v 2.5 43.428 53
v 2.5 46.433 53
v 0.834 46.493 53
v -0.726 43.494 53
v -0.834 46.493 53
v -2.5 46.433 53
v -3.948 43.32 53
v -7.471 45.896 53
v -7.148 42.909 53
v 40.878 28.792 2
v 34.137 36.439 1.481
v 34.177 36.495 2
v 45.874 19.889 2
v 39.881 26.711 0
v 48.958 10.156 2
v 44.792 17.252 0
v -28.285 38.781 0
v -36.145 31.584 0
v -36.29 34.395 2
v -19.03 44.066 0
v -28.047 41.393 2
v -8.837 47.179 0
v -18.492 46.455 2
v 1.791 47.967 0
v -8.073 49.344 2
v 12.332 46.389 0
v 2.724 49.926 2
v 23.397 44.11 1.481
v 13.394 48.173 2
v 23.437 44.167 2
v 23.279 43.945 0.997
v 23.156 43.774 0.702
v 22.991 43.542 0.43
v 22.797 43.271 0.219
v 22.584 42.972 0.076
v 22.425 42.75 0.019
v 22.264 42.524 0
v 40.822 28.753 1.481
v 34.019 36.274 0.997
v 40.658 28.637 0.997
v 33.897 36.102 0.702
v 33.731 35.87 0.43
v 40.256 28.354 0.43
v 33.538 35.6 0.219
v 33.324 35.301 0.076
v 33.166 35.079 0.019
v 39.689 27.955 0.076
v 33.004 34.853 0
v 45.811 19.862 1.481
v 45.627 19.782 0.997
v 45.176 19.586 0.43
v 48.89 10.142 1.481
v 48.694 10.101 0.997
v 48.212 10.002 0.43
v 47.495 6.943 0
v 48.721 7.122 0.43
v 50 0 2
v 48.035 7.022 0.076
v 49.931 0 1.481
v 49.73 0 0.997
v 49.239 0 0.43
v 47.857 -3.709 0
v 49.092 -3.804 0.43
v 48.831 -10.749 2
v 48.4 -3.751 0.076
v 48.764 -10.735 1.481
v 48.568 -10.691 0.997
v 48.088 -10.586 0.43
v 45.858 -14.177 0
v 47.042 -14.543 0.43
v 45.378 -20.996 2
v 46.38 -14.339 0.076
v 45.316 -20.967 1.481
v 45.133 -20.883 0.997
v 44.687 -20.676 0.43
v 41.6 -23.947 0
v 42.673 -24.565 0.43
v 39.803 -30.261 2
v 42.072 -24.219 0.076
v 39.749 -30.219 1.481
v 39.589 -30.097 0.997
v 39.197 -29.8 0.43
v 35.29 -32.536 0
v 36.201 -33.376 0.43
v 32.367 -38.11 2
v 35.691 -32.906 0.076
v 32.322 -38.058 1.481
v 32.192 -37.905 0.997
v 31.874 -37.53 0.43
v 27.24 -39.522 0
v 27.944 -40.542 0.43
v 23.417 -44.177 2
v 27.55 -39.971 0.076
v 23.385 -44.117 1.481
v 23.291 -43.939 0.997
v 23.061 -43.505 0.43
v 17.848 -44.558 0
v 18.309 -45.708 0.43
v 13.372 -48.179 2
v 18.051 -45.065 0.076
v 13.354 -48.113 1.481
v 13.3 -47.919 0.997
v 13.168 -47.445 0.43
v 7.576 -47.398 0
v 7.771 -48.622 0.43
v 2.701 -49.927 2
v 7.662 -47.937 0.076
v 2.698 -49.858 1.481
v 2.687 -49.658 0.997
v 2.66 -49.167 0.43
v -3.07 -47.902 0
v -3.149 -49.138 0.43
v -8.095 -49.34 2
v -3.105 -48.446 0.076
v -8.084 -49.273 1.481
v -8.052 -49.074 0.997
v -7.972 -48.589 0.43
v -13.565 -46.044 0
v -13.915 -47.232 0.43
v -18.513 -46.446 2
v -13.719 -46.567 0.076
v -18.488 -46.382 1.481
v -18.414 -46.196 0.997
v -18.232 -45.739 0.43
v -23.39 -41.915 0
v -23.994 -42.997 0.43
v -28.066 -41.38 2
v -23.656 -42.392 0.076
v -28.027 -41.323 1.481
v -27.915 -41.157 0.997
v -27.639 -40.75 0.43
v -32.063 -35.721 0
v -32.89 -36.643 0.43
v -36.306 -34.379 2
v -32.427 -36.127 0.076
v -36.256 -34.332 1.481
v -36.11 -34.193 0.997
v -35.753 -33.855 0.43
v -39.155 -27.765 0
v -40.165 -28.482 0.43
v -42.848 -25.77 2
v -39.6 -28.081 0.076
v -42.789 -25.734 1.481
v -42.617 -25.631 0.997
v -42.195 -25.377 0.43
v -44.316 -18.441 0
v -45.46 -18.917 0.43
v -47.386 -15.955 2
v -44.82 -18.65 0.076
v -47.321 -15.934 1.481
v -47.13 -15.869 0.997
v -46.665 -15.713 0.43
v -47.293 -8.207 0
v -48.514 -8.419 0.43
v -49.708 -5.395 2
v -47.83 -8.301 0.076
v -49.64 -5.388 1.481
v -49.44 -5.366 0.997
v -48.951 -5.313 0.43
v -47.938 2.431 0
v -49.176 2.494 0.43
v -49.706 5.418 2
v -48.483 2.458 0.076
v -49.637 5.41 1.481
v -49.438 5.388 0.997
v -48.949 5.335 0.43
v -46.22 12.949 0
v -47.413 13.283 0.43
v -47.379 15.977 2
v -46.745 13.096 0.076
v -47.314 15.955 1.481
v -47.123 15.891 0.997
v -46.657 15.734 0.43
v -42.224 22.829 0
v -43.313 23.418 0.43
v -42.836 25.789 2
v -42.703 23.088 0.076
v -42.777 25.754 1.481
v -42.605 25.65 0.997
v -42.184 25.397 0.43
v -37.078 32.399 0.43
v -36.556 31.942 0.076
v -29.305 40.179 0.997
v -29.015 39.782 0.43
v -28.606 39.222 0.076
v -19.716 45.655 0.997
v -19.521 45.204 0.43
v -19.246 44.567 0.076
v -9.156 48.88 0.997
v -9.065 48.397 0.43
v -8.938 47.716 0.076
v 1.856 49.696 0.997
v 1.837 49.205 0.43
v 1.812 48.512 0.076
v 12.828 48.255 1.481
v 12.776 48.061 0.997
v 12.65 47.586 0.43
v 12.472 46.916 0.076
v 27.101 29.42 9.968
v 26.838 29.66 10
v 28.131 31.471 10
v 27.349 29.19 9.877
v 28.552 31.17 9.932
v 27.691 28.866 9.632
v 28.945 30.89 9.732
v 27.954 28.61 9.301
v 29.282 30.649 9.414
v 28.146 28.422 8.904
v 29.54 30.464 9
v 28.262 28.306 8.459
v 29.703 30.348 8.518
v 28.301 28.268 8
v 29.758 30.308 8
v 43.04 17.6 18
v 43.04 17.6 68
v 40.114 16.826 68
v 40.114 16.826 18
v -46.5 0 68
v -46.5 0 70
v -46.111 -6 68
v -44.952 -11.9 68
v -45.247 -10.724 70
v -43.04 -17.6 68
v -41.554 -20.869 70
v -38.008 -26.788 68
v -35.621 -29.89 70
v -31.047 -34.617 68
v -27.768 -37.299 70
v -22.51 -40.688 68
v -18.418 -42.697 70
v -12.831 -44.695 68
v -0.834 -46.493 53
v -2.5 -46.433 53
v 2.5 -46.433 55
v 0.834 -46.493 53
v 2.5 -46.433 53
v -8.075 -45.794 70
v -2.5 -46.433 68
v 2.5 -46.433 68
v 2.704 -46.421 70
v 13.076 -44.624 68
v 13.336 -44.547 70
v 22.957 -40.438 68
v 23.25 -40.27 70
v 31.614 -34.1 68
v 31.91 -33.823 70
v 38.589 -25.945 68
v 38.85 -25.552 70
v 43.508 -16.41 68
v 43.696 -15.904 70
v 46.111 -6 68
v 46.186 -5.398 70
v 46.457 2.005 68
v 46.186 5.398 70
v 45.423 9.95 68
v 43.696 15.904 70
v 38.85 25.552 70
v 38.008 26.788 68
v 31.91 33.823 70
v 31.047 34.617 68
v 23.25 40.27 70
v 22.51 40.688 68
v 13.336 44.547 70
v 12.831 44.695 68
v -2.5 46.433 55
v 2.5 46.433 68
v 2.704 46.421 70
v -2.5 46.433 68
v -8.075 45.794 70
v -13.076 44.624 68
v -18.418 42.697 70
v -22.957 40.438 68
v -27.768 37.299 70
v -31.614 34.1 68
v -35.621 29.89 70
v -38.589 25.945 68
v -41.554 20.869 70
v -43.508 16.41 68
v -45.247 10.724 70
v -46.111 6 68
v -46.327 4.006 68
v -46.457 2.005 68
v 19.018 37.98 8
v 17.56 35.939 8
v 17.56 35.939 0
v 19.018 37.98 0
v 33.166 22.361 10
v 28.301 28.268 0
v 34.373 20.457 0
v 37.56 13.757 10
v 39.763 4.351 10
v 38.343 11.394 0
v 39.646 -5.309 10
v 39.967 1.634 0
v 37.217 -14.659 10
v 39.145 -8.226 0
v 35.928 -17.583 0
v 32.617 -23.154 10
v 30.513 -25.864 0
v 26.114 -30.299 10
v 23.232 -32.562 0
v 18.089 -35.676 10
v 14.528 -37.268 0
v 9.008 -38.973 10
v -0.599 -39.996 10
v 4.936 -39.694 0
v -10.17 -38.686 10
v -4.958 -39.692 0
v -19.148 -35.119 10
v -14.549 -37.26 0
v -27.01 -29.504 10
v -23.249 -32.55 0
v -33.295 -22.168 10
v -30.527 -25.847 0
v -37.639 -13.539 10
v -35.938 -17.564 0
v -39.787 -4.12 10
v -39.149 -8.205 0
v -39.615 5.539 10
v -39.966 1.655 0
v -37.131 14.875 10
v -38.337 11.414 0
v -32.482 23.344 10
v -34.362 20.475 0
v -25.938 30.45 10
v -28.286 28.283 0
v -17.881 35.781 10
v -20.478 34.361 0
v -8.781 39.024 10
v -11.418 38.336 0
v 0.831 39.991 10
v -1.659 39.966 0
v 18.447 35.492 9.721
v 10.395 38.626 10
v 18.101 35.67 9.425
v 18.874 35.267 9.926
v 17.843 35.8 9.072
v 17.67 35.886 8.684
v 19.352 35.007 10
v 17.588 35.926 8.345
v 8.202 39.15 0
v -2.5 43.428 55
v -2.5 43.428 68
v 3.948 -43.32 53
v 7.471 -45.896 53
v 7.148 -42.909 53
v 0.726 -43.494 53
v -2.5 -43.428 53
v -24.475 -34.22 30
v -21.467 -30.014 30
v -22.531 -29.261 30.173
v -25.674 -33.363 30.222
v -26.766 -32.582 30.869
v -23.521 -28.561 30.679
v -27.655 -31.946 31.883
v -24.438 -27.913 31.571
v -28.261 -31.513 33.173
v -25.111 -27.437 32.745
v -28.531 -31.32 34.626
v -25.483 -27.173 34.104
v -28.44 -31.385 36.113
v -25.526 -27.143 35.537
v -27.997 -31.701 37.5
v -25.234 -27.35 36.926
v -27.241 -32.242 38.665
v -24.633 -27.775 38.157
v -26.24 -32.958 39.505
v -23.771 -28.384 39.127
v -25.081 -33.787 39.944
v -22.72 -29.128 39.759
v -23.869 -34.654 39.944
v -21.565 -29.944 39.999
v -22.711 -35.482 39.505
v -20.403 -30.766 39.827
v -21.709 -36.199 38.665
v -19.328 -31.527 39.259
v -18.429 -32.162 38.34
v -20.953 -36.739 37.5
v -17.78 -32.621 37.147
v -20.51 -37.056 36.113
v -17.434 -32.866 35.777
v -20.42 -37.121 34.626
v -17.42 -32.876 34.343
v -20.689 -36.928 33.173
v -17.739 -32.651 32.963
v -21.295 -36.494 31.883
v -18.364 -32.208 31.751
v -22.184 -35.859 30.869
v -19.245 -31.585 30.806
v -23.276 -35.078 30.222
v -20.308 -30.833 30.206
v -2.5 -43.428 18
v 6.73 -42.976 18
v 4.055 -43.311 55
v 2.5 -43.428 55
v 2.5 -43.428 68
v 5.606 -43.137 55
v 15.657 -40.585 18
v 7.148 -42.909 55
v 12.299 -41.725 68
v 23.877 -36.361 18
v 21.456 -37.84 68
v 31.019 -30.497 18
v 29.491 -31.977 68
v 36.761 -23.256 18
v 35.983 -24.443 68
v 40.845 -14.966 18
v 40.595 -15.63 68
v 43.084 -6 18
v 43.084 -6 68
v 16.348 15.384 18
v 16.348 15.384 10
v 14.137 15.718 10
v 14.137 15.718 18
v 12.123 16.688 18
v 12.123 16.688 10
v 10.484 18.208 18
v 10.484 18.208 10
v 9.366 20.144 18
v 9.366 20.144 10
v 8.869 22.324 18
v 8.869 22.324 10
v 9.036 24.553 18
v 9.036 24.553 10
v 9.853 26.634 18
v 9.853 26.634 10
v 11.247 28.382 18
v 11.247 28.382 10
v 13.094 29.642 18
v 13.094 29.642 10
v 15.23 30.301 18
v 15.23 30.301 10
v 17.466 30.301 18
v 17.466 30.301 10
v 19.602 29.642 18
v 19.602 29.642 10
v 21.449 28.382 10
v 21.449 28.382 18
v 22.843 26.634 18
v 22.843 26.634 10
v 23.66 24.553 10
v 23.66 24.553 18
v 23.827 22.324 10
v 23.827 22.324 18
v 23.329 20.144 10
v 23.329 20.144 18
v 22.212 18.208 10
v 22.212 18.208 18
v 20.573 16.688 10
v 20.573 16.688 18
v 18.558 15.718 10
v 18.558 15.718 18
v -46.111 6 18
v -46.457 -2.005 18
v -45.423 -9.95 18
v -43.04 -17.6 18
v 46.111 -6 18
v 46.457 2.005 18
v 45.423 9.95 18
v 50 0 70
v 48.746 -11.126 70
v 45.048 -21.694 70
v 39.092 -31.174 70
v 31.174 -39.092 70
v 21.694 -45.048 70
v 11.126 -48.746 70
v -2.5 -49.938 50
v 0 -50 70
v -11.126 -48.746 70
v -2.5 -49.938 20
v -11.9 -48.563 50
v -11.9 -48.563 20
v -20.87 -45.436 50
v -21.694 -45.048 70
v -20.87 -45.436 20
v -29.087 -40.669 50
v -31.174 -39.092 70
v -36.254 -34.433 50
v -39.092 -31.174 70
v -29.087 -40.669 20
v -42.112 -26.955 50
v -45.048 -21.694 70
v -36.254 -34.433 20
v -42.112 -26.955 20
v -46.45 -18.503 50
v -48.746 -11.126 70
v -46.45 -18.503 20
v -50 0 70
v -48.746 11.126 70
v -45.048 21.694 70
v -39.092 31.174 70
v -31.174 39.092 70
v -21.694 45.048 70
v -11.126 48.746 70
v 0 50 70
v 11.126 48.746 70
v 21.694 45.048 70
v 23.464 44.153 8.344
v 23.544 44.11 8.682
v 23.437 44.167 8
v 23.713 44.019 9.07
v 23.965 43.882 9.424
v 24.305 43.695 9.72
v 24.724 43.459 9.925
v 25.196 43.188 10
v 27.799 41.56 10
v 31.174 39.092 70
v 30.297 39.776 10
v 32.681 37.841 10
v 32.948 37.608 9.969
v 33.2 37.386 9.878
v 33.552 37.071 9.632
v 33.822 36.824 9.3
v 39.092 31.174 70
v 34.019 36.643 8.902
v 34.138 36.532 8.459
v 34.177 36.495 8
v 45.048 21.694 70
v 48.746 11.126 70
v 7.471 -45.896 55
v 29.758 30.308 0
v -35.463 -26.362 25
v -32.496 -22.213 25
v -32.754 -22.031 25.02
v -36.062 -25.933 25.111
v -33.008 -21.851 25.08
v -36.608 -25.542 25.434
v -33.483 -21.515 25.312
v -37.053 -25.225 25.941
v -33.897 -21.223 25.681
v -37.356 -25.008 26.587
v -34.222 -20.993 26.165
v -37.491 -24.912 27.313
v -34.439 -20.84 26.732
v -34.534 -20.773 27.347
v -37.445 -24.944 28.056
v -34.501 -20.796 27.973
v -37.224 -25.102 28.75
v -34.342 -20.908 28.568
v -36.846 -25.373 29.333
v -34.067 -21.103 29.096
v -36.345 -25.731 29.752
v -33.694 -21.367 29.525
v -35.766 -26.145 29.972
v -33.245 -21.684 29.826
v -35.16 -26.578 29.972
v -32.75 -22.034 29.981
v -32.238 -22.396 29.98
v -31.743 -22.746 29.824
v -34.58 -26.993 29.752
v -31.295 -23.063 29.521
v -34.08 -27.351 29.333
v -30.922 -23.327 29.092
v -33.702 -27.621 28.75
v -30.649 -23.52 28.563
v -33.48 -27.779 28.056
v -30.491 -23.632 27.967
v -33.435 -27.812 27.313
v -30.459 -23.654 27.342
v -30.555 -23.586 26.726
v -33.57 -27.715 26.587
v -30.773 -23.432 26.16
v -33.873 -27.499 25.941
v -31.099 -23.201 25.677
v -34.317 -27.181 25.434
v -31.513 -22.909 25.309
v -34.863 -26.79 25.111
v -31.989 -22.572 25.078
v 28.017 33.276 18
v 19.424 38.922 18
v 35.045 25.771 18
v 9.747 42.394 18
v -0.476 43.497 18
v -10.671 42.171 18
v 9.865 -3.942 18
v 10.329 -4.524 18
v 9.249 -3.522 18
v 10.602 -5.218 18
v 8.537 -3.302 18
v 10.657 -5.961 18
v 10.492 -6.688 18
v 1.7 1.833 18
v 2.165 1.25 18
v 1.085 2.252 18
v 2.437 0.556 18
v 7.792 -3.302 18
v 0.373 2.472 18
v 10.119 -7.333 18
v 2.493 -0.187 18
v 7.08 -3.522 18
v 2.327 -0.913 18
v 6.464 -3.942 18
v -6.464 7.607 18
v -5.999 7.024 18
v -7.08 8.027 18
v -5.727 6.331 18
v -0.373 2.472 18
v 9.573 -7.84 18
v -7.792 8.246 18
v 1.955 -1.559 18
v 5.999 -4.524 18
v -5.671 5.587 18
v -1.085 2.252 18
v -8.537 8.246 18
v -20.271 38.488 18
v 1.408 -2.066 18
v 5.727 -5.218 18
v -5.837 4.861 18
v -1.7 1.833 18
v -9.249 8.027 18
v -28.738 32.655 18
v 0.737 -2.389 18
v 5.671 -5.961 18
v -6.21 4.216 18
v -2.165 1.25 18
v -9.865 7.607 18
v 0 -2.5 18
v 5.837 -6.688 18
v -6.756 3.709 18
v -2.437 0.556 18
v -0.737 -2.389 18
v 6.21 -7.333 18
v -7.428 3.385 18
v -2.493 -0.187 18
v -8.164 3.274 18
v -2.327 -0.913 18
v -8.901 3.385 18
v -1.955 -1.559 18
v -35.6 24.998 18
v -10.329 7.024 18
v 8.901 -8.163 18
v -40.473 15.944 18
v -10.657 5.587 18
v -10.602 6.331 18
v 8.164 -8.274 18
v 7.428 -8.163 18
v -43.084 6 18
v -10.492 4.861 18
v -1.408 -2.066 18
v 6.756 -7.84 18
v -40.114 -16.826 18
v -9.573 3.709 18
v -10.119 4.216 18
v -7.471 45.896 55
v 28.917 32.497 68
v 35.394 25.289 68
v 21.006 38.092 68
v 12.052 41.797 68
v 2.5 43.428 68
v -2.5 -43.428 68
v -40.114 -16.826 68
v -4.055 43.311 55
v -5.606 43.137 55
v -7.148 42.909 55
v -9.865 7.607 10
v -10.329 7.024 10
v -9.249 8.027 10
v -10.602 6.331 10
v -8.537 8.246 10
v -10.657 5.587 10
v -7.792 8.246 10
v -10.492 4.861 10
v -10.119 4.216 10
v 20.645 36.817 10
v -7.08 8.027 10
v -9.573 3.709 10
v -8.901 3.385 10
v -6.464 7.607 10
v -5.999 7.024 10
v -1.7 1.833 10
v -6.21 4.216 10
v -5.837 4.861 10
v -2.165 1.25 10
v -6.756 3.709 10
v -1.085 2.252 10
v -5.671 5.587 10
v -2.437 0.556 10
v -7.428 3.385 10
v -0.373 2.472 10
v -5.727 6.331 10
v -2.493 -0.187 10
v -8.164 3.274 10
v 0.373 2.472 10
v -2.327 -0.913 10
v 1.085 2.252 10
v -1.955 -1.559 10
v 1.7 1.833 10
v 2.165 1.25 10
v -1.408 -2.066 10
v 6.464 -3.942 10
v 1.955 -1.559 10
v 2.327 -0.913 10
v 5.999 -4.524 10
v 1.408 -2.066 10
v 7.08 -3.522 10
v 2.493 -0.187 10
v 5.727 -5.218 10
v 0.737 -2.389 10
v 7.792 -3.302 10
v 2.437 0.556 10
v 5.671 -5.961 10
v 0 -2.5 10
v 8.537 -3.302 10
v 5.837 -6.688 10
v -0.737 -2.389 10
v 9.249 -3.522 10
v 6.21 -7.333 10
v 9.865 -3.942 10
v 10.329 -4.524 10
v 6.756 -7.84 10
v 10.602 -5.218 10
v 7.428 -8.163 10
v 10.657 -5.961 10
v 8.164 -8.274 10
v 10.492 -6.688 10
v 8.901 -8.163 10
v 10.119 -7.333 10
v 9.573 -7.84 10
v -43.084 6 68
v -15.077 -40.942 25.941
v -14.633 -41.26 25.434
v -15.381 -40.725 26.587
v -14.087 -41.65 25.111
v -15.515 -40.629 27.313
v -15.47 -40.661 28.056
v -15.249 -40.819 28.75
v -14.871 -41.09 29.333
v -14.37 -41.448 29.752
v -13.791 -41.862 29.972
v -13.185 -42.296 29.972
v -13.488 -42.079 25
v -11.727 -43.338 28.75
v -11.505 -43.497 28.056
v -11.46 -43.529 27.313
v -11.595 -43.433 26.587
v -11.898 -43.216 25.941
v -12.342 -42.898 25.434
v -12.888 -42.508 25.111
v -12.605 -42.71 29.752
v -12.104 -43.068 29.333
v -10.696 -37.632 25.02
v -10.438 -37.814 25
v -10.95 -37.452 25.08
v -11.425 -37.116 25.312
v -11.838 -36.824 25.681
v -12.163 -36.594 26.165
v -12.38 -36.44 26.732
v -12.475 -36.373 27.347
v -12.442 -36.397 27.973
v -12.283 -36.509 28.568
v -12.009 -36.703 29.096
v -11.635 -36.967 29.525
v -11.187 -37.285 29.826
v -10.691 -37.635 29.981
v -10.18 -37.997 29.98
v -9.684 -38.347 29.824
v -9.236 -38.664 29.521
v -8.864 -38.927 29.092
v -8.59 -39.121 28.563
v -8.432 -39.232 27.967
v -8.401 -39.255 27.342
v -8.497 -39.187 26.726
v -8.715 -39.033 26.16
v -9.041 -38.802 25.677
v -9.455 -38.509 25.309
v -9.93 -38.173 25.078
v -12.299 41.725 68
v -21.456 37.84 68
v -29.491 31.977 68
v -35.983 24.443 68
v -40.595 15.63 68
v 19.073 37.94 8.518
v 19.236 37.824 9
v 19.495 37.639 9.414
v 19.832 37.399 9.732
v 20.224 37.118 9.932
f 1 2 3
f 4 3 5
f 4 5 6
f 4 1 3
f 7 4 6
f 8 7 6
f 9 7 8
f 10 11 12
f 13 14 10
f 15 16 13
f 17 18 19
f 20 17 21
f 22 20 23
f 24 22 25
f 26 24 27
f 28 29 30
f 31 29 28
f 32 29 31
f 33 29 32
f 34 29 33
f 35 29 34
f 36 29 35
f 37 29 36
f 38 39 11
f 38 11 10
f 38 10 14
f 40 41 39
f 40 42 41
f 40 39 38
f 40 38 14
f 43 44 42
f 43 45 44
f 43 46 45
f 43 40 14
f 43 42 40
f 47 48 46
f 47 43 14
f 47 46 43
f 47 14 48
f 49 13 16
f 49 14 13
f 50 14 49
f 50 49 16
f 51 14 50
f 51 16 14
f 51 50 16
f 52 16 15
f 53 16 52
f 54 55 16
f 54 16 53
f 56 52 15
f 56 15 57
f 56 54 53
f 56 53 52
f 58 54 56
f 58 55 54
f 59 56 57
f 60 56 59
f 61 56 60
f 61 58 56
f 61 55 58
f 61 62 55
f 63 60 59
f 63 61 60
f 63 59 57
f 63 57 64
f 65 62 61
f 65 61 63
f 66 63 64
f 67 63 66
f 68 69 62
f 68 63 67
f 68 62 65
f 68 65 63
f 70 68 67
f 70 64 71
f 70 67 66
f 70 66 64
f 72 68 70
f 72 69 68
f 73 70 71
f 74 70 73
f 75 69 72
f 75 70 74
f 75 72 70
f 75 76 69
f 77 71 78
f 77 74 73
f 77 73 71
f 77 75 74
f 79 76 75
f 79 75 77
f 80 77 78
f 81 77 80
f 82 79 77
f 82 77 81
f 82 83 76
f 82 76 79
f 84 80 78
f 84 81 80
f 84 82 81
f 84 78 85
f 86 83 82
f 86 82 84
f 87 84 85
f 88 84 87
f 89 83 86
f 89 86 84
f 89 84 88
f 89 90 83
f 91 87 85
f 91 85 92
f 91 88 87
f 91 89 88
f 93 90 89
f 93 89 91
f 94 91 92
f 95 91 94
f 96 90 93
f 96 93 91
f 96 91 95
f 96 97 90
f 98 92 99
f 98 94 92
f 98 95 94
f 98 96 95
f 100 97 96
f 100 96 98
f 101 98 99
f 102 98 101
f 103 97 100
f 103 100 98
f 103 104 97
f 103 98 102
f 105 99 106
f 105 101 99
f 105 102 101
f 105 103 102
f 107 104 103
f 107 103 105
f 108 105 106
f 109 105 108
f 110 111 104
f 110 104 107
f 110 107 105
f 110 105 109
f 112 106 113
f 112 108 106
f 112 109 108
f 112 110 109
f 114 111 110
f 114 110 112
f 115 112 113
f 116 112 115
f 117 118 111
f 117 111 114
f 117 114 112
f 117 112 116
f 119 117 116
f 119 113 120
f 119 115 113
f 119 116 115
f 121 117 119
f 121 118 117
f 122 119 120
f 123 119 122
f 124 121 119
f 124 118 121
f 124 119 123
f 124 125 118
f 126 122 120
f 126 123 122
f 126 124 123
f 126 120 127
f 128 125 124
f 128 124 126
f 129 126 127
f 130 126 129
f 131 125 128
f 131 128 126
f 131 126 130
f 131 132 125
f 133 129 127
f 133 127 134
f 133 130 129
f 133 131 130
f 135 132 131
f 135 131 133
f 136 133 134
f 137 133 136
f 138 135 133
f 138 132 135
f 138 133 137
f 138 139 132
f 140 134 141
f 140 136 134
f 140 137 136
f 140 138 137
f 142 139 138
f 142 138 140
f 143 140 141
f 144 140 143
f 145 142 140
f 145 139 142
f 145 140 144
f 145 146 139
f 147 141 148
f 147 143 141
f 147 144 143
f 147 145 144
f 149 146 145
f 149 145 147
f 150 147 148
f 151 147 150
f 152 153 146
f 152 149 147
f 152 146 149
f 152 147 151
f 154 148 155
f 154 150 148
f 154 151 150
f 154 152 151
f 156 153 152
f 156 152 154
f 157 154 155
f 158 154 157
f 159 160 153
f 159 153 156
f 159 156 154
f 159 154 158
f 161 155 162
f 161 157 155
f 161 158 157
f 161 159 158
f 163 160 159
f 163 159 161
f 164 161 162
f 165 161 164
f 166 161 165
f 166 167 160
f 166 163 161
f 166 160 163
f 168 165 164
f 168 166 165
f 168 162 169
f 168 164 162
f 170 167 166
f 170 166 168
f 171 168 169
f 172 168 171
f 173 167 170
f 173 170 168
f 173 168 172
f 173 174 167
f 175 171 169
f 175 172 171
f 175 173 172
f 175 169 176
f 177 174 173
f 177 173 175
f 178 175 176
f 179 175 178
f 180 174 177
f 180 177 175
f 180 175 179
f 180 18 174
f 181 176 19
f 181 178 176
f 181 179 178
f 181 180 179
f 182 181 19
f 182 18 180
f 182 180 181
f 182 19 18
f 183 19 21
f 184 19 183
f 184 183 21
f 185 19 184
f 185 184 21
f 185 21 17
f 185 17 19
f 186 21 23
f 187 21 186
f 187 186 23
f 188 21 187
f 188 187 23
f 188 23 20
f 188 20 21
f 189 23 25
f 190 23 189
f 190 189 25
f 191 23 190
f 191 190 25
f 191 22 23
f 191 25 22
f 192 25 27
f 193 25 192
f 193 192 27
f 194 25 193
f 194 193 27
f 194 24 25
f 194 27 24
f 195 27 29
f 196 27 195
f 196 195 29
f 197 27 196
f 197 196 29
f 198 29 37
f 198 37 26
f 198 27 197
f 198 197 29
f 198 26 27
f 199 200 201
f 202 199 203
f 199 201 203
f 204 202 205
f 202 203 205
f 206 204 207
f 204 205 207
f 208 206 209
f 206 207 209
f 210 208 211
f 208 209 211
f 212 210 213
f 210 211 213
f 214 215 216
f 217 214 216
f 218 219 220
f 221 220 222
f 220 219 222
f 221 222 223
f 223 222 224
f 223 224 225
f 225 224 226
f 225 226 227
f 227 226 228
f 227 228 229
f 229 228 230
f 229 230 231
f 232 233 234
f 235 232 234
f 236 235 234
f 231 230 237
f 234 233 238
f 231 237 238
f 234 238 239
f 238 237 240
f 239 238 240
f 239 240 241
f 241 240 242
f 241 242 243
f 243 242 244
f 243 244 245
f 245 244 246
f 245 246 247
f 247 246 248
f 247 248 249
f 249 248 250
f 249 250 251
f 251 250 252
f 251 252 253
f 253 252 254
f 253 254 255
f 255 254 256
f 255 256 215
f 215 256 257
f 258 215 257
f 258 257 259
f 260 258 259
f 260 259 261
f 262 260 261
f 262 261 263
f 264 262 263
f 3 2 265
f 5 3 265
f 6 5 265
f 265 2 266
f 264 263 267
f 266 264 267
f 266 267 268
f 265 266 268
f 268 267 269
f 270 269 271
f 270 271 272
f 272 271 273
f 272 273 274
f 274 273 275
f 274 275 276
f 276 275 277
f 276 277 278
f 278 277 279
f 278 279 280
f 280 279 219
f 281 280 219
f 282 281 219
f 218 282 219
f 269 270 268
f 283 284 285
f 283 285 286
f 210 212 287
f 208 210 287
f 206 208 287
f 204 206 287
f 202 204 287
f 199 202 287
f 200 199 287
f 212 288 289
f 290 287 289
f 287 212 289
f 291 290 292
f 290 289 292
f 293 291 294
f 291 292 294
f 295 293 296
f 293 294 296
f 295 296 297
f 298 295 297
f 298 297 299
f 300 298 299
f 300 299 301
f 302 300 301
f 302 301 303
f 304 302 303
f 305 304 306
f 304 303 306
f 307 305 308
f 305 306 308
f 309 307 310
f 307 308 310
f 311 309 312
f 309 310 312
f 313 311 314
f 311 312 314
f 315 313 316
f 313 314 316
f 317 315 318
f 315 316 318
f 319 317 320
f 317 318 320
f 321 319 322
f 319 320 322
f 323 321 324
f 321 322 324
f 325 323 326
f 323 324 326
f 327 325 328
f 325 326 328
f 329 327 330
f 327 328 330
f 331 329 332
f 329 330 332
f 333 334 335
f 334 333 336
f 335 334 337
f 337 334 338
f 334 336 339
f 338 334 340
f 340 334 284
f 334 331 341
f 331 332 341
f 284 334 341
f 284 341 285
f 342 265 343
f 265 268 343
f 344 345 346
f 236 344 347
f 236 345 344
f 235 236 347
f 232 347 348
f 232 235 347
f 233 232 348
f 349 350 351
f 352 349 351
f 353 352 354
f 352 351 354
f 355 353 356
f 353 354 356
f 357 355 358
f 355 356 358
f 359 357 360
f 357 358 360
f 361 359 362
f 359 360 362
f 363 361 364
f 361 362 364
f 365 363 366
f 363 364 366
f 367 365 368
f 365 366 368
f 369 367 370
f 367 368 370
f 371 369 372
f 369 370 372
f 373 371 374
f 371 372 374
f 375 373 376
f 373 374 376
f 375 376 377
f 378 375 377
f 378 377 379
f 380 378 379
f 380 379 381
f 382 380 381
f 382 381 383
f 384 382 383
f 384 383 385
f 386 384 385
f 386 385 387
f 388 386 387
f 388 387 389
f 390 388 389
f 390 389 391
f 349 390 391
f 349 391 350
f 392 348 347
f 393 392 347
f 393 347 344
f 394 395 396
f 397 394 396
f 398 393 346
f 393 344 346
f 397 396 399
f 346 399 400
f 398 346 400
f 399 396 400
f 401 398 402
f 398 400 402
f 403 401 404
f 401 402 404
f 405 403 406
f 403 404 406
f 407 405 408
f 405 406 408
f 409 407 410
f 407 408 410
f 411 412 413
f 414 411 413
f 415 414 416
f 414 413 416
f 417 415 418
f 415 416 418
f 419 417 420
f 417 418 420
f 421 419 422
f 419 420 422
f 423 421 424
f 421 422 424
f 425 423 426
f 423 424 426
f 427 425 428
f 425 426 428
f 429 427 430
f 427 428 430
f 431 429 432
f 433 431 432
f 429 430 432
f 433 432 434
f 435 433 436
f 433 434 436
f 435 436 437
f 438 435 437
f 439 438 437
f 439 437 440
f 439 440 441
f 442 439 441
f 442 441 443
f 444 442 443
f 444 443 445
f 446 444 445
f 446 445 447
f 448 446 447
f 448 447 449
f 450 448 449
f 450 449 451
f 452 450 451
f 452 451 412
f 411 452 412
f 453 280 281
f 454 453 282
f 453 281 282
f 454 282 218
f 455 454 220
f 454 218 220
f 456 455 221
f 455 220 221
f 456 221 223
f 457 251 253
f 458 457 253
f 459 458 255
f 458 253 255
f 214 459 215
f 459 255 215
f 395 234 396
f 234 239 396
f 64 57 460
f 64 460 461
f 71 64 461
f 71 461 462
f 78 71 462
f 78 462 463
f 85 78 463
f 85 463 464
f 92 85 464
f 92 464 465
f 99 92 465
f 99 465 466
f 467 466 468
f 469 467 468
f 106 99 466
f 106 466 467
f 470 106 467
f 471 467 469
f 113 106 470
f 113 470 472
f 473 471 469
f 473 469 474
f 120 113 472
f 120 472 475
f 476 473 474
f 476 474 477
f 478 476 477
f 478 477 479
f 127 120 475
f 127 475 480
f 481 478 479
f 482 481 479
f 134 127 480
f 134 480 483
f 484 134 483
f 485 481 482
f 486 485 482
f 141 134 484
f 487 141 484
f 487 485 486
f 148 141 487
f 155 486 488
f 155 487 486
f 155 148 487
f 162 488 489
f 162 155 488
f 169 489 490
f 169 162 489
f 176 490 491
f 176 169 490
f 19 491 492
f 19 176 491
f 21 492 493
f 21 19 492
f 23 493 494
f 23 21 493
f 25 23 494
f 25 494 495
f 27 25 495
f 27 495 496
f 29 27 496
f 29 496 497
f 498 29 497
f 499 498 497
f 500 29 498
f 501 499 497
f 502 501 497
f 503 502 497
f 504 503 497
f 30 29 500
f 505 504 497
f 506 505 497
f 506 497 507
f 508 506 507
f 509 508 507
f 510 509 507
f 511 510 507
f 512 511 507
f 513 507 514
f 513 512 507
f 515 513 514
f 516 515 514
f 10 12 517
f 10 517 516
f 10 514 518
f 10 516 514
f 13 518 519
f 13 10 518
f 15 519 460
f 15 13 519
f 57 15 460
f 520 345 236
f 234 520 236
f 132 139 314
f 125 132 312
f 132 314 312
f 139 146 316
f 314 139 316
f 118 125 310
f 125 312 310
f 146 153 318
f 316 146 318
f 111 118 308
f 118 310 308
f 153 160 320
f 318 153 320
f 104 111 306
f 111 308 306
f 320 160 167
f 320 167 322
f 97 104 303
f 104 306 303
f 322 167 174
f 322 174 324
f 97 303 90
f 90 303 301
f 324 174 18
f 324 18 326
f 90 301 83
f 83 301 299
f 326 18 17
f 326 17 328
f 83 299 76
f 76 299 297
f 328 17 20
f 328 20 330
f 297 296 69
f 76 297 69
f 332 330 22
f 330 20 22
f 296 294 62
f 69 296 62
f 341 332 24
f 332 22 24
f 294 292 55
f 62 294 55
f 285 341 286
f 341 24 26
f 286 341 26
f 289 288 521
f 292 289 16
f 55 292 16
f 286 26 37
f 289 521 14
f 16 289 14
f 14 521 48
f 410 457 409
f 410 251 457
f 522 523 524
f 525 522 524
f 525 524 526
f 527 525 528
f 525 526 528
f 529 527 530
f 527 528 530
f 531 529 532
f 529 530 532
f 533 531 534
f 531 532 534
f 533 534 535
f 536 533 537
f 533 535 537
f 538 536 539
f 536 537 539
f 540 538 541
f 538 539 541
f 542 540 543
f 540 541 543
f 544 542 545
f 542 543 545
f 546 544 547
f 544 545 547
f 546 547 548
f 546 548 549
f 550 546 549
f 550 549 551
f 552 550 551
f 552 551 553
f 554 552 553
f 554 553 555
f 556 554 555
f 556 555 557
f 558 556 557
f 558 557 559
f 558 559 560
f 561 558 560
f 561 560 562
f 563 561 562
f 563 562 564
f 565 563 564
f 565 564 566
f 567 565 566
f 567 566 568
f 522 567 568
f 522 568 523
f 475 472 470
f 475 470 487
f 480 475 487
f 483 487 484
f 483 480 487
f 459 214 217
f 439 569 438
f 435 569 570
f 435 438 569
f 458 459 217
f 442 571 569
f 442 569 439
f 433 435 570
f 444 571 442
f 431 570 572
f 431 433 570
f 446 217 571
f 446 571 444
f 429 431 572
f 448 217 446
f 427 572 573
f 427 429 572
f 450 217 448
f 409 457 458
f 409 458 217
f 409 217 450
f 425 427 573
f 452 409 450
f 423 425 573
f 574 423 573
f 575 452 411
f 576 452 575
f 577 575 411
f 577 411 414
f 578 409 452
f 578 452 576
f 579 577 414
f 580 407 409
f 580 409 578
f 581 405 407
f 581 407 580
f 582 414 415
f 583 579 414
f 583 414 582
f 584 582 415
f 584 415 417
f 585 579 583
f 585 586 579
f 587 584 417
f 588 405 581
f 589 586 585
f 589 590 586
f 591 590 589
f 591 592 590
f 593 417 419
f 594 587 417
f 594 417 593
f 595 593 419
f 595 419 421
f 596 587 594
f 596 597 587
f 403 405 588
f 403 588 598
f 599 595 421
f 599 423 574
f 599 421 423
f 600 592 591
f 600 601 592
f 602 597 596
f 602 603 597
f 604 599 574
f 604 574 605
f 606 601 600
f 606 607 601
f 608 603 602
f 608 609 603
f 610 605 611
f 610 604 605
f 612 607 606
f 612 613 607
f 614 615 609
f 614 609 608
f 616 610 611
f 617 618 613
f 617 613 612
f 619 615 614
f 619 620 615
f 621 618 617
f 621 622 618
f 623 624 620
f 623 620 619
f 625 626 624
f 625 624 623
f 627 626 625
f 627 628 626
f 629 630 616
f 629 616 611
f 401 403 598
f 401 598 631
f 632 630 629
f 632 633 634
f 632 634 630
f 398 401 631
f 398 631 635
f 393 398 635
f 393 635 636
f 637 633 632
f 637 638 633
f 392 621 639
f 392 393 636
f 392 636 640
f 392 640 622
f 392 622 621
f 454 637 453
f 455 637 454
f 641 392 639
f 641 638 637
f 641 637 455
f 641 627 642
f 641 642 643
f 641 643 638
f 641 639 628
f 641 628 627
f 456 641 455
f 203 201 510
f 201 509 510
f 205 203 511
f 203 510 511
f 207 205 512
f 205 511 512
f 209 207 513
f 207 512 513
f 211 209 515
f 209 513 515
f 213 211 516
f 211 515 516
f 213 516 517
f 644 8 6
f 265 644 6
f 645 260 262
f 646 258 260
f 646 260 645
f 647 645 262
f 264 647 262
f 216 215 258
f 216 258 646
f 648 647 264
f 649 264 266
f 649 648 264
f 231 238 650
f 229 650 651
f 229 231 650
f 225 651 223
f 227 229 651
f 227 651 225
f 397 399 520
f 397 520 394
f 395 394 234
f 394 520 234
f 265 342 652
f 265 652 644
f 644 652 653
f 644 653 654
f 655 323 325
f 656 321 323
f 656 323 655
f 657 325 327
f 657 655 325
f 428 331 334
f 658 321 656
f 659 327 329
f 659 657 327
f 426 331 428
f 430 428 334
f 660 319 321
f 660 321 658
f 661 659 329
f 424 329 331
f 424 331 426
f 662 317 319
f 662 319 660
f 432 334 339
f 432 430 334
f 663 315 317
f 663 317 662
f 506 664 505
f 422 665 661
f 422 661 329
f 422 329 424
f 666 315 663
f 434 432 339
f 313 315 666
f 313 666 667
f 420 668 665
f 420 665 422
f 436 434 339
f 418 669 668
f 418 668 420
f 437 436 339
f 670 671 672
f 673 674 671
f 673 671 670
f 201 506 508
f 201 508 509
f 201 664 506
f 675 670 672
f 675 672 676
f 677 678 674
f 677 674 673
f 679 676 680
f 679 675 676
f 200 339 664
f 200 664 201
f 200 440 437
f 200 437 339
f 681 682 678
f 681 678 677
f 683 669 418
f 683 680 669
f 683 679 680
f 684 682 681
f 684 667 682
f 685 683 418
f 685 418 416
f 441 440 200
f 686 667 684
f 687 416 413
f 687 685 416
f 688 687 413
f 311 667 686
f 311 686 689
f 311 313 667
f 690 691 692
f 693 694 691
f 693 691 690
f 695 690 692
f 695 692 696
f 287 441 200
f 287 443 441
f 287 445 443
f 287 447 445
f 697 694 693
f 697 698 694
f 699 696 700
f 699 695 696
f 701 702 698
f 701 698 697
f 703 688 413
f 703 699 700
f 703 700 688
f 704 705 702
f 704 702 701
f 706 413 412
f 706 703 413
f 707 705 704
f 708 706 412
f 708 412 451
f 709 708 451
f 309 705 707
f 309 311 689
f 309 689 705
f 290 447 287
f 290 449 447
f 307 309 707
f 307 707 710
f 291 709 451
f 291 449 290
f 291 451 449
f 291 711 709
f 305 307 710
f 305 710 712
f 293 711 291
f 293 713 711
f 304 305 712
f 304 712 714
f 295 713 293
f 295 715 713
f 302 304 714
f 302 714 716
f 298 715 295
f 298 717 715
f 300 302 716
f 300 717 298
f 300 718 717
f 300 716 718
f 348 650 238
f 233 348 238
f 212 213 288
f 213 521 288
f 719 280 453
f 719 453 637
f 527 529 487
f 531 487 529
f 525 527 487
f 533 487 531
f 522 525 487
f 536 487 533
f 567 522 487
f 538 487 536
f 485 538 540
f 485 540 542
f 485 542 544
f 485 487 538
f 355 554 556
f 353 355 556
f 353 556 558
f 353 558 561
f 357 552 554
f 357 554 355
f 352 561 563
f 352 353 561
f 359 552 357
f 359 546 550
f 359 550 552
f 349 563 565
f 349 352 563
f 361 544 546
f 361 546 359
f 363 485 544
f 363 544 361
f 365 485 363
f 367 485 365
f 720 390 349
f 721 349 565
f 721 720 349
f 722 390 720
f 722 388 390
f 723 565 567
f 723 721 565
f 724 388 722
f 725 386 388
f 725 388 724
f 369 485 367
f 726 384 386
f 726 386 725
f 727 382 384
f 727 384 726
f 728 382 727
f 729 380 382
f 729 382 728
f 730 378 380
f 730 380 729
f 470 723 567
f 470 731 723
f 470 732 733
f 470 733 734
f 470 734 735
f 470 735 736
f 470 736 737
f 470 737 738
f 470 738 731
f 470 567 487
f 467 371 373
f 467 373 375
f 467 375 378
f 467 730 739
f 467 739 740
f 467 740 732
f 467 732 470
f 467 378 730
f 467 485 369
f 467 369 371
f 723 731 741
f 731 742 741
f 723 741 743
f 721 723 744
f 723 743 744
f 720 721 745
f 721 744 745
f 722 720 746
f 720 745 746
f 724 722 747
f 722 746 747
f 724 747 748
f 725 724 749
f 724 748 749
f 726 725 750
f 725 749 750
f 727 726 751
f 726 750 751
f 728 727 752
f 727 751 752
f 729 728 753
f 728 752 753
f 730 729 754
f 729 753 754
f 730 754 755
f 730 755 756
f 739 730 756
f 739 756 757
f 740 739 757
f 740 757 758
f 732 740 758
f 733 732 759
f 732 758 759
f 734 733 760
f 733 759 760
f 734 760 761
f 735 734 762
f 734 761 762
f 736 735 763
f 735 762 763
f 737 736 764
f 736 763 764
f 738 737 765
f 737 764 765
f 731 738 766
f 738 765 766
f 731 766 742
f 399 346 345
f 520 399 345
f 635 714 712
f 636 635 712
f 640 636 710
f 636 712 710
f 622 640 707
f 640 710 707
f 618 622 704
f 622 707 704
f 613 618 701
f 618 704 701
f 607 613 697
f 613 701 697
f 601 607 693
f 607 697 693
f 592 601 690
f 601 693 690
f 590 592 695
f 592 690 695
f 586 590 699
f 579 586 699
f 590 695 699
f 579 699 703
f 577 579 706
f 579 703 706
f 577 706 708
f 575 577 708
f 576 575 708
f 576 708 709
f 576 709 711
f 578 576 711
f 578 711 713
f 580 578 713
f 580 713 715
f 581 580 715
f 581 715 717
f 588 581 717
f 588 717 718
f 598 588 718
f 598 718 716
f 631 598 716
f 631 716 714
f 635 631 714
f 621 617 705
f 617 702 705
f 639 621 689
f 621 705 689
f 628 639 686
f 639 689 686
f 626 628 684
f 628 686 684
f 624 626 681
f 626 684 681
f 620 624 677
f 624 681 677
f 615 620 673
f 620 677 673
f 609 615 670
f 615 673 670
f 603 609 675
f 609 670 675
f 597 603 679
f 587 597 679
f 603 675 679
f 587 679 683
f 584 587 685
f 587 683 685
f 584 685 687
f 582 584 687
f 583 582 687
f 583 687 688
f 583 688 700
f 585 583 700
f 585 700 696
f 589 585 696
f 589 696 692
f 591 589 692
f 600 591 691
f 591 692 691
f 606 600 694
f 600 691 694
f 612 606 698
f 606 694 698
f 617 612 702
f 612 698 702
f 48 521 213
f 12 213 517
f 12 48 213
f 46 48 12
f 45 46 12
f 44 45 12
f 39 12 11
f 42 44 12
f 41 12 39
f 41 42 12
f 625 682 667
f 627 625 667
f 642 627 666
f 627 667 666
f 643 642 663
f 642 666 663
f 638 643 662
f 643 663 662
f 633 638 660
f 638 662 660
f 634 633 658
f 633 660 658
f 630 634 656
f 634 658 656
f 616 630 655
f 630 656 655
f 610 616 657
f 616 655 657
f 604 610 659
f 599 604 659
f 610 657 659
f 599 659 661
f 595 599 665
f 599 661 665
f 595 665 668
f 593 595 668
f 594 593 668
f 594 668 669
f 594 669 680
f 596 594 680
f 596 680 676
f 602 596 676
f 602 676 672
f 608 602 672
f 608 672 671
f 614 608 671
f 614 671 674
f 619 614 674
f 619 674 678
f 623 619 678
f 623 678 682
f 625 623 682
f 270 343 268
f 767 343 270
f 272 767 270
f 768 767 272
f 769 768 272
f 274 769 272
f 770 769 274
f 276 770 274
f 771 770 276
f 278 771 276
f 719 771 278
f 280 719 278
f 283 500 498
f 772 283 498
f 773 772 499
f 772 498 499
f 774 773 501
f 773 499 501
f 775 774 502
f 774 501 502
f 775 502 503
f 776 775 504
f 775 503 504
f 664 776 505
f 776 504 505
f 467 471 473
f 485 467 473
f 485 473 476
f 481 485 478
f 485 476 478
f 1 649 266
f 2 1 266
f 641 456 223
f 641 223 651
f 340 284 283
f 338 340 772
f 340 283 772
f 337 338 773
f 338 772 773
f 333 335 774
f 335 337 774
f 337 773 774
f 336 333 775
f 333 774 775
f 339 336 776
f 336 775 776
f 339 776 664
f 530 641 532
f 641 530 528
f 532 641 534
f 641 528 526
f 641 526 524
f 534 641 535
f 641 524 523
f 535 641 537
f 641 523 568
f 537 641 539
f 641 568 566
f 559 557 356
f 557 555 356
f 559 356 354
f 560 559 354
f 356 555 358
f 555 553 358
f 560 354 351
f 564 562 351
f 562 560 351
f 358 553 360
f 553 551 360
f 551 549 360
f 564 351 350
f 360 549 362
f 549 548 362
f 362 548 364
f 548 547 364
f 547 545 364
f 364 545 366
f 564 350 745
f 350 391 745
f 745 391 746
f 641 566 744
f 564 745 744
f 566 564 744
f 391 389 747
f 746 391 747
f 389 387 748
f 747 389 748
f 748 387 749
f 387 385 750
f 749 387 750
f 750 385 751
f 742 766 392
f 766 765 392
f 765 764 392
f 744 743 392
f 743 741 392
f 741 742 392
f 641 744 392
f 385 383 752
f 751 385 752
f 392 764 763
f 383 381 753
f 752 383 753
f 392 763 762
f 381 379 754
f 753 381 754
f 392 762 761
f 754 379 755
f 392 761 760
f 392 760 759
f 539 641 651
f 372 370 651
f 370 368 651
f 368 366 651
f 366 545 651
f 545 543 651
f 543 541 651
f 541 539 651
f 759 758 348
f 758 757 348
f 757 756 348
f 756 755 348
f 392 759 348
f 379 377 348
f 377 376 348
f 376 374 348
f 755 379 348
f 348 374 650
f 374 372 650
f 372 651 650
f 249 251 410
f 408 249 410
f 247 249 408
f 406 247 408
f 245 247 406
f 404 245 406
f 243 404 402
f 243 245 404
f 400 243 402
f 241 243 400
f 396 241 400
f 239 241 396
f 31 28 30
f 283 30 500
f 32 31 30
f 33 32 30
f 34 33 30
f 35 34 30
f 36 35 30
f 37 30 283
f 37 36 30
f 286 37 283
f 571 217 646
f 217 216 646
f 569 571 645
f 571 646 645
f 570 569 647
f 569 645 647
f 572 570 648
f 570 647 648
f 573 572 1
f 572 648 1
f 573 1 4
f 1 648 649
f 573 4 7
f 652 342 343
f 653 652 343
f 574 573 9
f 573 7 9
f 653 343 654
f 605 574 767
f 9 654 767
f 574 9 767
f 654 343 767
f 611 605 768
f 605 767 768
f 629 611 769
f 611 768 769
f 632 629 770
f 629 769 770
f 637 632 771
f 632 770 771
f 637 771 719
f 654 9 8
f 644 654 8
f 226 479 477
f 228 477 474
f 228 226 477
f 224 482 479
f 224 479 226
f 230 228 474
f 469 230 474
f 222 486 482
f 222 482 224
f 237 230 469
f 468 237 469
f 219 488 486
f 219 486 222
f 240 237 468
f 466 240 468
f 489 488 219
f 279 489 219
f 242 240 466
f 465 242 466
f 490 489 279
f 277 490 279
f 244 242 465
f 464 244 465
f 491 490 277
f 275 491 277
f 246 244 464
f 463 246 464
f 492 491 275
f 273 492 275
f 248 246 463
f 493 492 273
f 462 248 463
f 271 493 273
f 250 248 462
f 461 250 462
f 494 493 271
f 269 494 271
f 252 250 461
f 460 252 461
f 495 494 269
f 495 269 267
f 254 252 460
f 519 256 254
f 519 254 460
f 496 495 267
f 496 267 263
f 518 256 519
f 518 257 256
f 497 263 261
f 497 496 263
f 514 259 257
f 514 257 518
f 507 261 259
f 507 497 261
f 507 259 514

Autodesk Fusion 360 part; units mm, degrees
sketch "Sketch1" plane through (0, 0, 0) normal (0, 0, 1) x (1, 0, 0)
  circle A0 centre (0, 0) radius 50
extrude "Extrude1" add sketch "Sketch1" along normal blind 70
sketch "Sketch2" plane through (0, 0, 0) normal (0, 0, -1) x (1, 0, 0)
  circle A0 centre (0, 0) radius 50
  circle A1 centre (0, 0) radius 40
  dimension "d3" = 80
extrude "Extrude2" cut sketch "Sketch2" against normal blind 10 contours A1
sketch "Sketch3" plane through (0, 0, 70) normal (0, 0, 1) x (-1, 0, 0)
  circle A0 centre (0, 0) radius 50
  circle A1 centre (0, 0) radius 46.5
  dimension "d6" = 93
extrude "Extrude3" cut sketch "Sketch3" against normal blind 2 contours A1
sketch "Sketch4" plane through (0, 0, 68) normal (0, 0, 1) x (-1, 0, 0)
  circle A0 centre (0, 0) radius 46.5
  circle A1 centre (0, 0) radius 43.5
  dimension "d9" = 87
extrude "Extrude4" cut sketch "Sketch4" against normal blind 50 contours A1
sketch "Sketch5" plane through (0, 0, 68) normal (0, 0, 1) x (-1, 0, 0)
  circle A0 centre (0, 0) radius 43.5
  circle A1 centre (0, 0) radius 46.5
  arc A2 (-2.5, -46.4327) -> (2.5, -46.4327) centre (0, 0) ccw
  arc A3 (2.5, 46.4327) -> (-2.5, 46.4327) centre (0, 0) ccw
  line L0 (2.5, 43.4281) -> (-2.5, 43.4281)
  line L1 (2.5, -43.4281) -> (-2.5, -43.4281)
  line L2 (2.5, -46.4327) -> (2.5, -43.4281)
  line L3 (2.5, 43.4281) -> (2.5, 46.4327)
  line L4 (-2.5, 46.4327) -> (-2.5, 43.4281)
  line L5 (-2.5, -43.4281) -> (-2.5, -46.4327)
  dimension "d12" = 5
extrude "Extrude5" cut sketch "Sketch5" against normal blind 15 contours A0 A1 A3 L3 L4 | A0 A1 A2 L2 L5
sketch "Sketch6" plane through (0, 0, 53) normal (0, 0, 1) x (-1, 0, 0)
  line L0 (2.5, 43.4281) -> (2.5, 46.4327)
  arc A0 (2.5, 46.4327) -> (-2.5, 46.4327) centre (0, 0) ccw
  line L1 (-2.5, 46.4327) -> (-2.5, 43.4281)
  arc A1 (2.5, 43.4281) -> (-2.5, 43.4281) centre (0, 0) ccw
  circle A2 centre (0, 0) radius 46.5
  line L2 (-2.5, 46.4327) -> (7.4711, -45.8959)
  line L3 (7.4711, -45.8959) -> (2.5, -46.4327)
  line L4 (2.5, -46.4327) -> (-7.4711, 45.8959)
  line L5 (-7.4711, 45.8959) -> (-2.5, 46.4327)
  dimension "d15" = 93
  dimension "d16" = 5
extrude "Extrude6" cut sketch "Sketch6" along normal blind 2 contours L1 A1 L2 L3 L4 L5
sketch "Sketch7" plane through (0, 0, 68) normal (0, 0, 1) x (-1, 0, 0)
  line L0 (-2.5, 43.4281) -> (-2.5, 46.4327)
  arc A0 (-2.5, 46.4327) -> (-2.5, -46.4327) centre (0, 0) ccw
  line L1 (-2.5, -46.4327) -> (-2.5, -43.4281)
  arc A1 (-2.5, 43.4281) -> (-2.5, -43.4281) centre (0, 0) ccw
  line L2 (-46.1113, 6) -> (-0.7807, 6)
  line L3 (-43.0404, -17.6004) -> (0.7807, -6)
  line L4 (43.0404, 17.6004) -> (-0.7807, 6)
  line L5 (46.1113, -6) -> (0.7807, -6)
  arc A2 (-46.1113, 6) -> (-43.0404, -17.6004) centre (0, 0) ccw
  arc A3 (46.1113, -6) -> (43.0404, 17.6004) centre (0, 0) ccw
  dimension "d19" = 93
  dimension "d20" = 12
  dimension "d21" = 12
extrude "Extrude7" cut sketch "Sketch7" against normal blind 50 contours A1 L2 L3 L4 L5 A3 | A0 A1 L2 L3 A2
sketch "Sketch8" plane through (0, 0, 18) normal (0, 0, 1) x (-1, 0, 0)
  arc A0 (40.1141, 16.8258) -> (-43.0842, 6) centre (0, 0) ccw
  line L0 (-43.0842, 6) -> (-46.1113, 6)
  arc A1 (-46.1113, 6) -> (-43.0404, -17.6004) centre (0, 0) ccw
  line L1 (-43.0404, -17.6004) -> (-40.1141, -16.8258)
  arc A2 (-40.1141, -16.8258) -> (43.0842, -6) centre (0, 0) ccw
  line L2 (43.0842, -6) -> (46.1113, -6)
  arc A3 (46.1113, -6) -> (43.0404, 17.6004) centre (0, 0) ccw
  line L3 (43.0404, 17.6004) -> (40.1141, 16.8258)
fillet "Fillet1" radius 2 1 edges at (-46.6164, -18.0808, 0)
sketch "Sketch11" plane through (0, 0, 68) normal (0, 0, 1) x (-1, 0, 0)
  line L0 (40.1141, 16.8258) -> (43.0404, 17.6004)
  arc A0 (43.0404, 17.6004) -> (2.5, 46.4327) centre (0, 0) ccw
  line L1 (2.5, 46.4327) -> (2.5, 43.4281)
  arc A1 (40.1141, 16.8258) -> (2.5, 43.4281) centre (0, 0) ccw
  line L2 (40.1141, 16.8258) -> (2.5, 43.4281)
  arc A2 (40.1141, 16.8258) -> (2.5, 43.4281) centre (0, 0) ccw
  dimension "d27" = 87
extrude "Extrude8" add sketch "Sketch11" against normal blind 50 contours A1 L2 A2
sketch "Sketch12" plane through (0, 0, 68) normal (0, 0, 1) x (-1, 0, 0)
  line L0 (40.1141, 16.8258) -> (43.0404, 17.6004)
  arc A0 (43.0404, 17.6004) -> (2.5, 46.4327) centre (0, 0) ccw
  line L1 (2.5, 46.4327) -> (2.5, 43.4281)
  line L2 (2.5, 43.4281) -> (40.1141, 16.8258)
  line L3 (40.1141, 16.8258) -> (46.4504, 18.5031)
  line L4 (2.5, 43.4281) -> (2.5, 49.9375)
  line L5 (46.4504, 18.5031) -> (2.5, 49.9375)
  arc A1 (46.4504, 18.5031) -> (2.5, 49.9375) centre (0, 0) ccw
  dimension "d30" = 100
extrude "Extrude9" cut sketch "Sketch12" against normal blind 30 from surface at -18 contours A0 L5 | A0 L5 A1
sketch "Sketch13" plane through (0, 0, 68) normal (0, 0, 1) x (-1, 0, 0)
  line L0 (40.1141, 16.8258) -> (43.0404, 17.6004)
  arc A0 (43.0404, 17.6004) -> (2.5, 46.4327) centre (0, 0) ccw
  line L1 (2.5, 46.4327) -> (2.5, 43.4281)
  line L2 (2.5, 43.4281) -> (40.1141, 16.8258)
  circle A1 centre (0, 0) radius 43.5
  line L3 (2.5, 43.4281) -> (40.1141, 16.8258)
extrude "Extrude10" cut sketch "Sketch13" against normal blind 15 contours L2 A1 L3 picked at (-1.1422, 13.8177)
sketch "Sketch14" plane through (0, 0, 0) normal (0, 0, -1) x (1, 0, 0)
  circle A0 centre (0, 0) radius 40
  circle A1 centre (0, 0) radius 48
  circle A2 centre (0, 0) radius 50
  dimension "d36" = 100
sketch "Sketch15" plane through (-24.4752, -34.2203, 0) normal (-0.5817, -0.8134, 0) x (0.8134, -0.5817, 0)
  line L0 (27.0174, 50) -> (-27.0174, 50)
  line L1 (-27.0174, 50) -> (-27.0174, 20)
  line L2 (-27.0174, 20) -> (27.0174, 20)
  line L3 (27.0174, 20) -> (27.0174, 50)
  line L4 (-27.0174, 20) -> (-27.0174, 0)
  line L5 (-27.0174, 0) -> (27.0174, 0)
  line L6 (27.0174, 0) -> (27.0174, 20)
sketch "Sketch16" plane through (0, 0, 0) normal (0, 0, -1) x (1, 0, 0)
  line L0 (-46.5152, 18.3394) -> (-2.261, 49.9489)
  line L1 (-2.261, 49.9489) -> (46.5152, -18.3394)
  line L2 (2.261, -49.9489) -> (-46.5152, 18.3394)
  circle A0 centre (0, 0) radius 50
  line L3 (46.5152, -18.3394) -> (29.7583, -30.3084)
  line L4 (19.0179, -37.9799) -> (2.261, -49.9489)
  line L5 (29.7583, -30.3084) -> (43.266, -49.2197)
  line L6 (43.266, -49.2197) -> (32.5257, -56.8912)
  line L7 (32.5257, -56.8912) -> (19.0179, -37.9799)
  line L8 (29.7583, -30.3084) -> (17.998, -13.8436)
  line L9 (17.998, -13.8436) -> (7.2576, -21.5151)
  line L10 (7.2576, -21.5151) -> (19.0179, -37.9799)
extrude "Extrude11" cut sketch "Sketch16" against normal blind 10 contours A0 L5 L7 L8 L9 L10 | A0 L5 L6 L7
fillet "Fillet2" radius 2 1 edges at (31.2391, 32.3815, 10)
fillet "Fillet3" radius 2 1 edges at (20.4987, 40.053, 10)
hole "Hole1" at (16.3478, 22.8843, 18) direction (0, 0, -1) diameter 15 depth 20 tip angle 118
sketch "Sketch18" plane through (-24.4752, -34.2203, 0) normal (-0.5817, -0.8134, 0) x (0.8134, -0.5817, 0)
  line L0 (27.0174, 50) -> (-27.0174, 50)
  line L1 (-27.0174, 50) -> (-27.0174, 20)
  line L2 (-27.0174, 20) -> (27.0174, 20)
  line L3 (27.0174, 20) -> (27.0174, 50)
  line L4 (-27.0174, 35) -> (27.0174, 35)
  line L5 (0, 35) -> (0, 20)
  line L6 (0, 27.5) -> (27.0174, 27.5)
  line L7 (13.5087, 27.5) -> (13.5087, 35)
  line L8 (0, 27.5) -> (-27.0174, 27.5)
  line L9 (-27.0174, 27.5) -> (-13.5087, 27.5)
  line L10 (-13.5087, 35) -> (-13.5087, 27.5)
  line L11 (0, 35) -> (0, 50)
  line L12 (0, 42.5) -> (27.0174, 42.5)
hole "Hole6" at (-35.4628, -26.3617, 27.5) direction (0.5817, 0.8134, 0) diameter 5 depth 10 tip angle 118
hole "Hole7" at (-13.4876, -42.0789, 27.5) direction (0.5817, 0.8134, 0) diameter 5 depth 10 tip angle 118
hole "Hole8" at (-24.4752, -34.2203, 35) direction (0.5817, 0.8134, 0) diameter 10 depth 10 tip angle 118
sketch "Sketch19" plane through (0, 0, 18) normal (0, 0, 1) x (-1, 0, 0)
  circle A0 centre (-16.3478, -22.8843) radius 7.5
  line L0 (40.1141, 16.8258) -> (2.5, 43.4281)
  arc A1 (2.5, 43.4281) -> (-43.0842, 6) centre (0, 0) ccw
  line L1 (-43.0842, 6) -> (-46.1113, 6)
  arc A2 (-46.1113, 6) -> (-43.0404, -17.6004) centre (0, 0) ccw
  line L2 (-43.0404, -17.6004) -> (-40.1141, -16.8258)
  arc A3 (-40.1141, -16.8258) -> (43.0842, -6) centre (0, 0) ccw
  line L3 (43.0842, -6) -> (46.1113, -6)
  arc A4 (46.1113, -6) -> (43.0404, 17.6004) centre (0, 0) ccw
  line L4 (43.0404, 17.6004) -> (40.1141, 16.8258)
  circle A5 centre (0, 0) radius 46.5
  circle A6 centre (0, 0) radius 46.5
  line L5 (43.0404, 17.6004) -> (-43.0404, -17.6004)
  line L6 (-46.1113, 6) -> (46.1113, -6)
hole "Hole9" at (0, 0, 18) direction (0, 0, -1) diameter 5 depth 8 tip angle 118
pattern_linear "R-Pattern1" count 2 spacing 10 along (0.8164, -0.5774, 0) of "Hole9"
pattern_linear "R-Pattern2" count 2 spacing 10 along (-0.8164, 0.5774, 0) of "Hole9"
